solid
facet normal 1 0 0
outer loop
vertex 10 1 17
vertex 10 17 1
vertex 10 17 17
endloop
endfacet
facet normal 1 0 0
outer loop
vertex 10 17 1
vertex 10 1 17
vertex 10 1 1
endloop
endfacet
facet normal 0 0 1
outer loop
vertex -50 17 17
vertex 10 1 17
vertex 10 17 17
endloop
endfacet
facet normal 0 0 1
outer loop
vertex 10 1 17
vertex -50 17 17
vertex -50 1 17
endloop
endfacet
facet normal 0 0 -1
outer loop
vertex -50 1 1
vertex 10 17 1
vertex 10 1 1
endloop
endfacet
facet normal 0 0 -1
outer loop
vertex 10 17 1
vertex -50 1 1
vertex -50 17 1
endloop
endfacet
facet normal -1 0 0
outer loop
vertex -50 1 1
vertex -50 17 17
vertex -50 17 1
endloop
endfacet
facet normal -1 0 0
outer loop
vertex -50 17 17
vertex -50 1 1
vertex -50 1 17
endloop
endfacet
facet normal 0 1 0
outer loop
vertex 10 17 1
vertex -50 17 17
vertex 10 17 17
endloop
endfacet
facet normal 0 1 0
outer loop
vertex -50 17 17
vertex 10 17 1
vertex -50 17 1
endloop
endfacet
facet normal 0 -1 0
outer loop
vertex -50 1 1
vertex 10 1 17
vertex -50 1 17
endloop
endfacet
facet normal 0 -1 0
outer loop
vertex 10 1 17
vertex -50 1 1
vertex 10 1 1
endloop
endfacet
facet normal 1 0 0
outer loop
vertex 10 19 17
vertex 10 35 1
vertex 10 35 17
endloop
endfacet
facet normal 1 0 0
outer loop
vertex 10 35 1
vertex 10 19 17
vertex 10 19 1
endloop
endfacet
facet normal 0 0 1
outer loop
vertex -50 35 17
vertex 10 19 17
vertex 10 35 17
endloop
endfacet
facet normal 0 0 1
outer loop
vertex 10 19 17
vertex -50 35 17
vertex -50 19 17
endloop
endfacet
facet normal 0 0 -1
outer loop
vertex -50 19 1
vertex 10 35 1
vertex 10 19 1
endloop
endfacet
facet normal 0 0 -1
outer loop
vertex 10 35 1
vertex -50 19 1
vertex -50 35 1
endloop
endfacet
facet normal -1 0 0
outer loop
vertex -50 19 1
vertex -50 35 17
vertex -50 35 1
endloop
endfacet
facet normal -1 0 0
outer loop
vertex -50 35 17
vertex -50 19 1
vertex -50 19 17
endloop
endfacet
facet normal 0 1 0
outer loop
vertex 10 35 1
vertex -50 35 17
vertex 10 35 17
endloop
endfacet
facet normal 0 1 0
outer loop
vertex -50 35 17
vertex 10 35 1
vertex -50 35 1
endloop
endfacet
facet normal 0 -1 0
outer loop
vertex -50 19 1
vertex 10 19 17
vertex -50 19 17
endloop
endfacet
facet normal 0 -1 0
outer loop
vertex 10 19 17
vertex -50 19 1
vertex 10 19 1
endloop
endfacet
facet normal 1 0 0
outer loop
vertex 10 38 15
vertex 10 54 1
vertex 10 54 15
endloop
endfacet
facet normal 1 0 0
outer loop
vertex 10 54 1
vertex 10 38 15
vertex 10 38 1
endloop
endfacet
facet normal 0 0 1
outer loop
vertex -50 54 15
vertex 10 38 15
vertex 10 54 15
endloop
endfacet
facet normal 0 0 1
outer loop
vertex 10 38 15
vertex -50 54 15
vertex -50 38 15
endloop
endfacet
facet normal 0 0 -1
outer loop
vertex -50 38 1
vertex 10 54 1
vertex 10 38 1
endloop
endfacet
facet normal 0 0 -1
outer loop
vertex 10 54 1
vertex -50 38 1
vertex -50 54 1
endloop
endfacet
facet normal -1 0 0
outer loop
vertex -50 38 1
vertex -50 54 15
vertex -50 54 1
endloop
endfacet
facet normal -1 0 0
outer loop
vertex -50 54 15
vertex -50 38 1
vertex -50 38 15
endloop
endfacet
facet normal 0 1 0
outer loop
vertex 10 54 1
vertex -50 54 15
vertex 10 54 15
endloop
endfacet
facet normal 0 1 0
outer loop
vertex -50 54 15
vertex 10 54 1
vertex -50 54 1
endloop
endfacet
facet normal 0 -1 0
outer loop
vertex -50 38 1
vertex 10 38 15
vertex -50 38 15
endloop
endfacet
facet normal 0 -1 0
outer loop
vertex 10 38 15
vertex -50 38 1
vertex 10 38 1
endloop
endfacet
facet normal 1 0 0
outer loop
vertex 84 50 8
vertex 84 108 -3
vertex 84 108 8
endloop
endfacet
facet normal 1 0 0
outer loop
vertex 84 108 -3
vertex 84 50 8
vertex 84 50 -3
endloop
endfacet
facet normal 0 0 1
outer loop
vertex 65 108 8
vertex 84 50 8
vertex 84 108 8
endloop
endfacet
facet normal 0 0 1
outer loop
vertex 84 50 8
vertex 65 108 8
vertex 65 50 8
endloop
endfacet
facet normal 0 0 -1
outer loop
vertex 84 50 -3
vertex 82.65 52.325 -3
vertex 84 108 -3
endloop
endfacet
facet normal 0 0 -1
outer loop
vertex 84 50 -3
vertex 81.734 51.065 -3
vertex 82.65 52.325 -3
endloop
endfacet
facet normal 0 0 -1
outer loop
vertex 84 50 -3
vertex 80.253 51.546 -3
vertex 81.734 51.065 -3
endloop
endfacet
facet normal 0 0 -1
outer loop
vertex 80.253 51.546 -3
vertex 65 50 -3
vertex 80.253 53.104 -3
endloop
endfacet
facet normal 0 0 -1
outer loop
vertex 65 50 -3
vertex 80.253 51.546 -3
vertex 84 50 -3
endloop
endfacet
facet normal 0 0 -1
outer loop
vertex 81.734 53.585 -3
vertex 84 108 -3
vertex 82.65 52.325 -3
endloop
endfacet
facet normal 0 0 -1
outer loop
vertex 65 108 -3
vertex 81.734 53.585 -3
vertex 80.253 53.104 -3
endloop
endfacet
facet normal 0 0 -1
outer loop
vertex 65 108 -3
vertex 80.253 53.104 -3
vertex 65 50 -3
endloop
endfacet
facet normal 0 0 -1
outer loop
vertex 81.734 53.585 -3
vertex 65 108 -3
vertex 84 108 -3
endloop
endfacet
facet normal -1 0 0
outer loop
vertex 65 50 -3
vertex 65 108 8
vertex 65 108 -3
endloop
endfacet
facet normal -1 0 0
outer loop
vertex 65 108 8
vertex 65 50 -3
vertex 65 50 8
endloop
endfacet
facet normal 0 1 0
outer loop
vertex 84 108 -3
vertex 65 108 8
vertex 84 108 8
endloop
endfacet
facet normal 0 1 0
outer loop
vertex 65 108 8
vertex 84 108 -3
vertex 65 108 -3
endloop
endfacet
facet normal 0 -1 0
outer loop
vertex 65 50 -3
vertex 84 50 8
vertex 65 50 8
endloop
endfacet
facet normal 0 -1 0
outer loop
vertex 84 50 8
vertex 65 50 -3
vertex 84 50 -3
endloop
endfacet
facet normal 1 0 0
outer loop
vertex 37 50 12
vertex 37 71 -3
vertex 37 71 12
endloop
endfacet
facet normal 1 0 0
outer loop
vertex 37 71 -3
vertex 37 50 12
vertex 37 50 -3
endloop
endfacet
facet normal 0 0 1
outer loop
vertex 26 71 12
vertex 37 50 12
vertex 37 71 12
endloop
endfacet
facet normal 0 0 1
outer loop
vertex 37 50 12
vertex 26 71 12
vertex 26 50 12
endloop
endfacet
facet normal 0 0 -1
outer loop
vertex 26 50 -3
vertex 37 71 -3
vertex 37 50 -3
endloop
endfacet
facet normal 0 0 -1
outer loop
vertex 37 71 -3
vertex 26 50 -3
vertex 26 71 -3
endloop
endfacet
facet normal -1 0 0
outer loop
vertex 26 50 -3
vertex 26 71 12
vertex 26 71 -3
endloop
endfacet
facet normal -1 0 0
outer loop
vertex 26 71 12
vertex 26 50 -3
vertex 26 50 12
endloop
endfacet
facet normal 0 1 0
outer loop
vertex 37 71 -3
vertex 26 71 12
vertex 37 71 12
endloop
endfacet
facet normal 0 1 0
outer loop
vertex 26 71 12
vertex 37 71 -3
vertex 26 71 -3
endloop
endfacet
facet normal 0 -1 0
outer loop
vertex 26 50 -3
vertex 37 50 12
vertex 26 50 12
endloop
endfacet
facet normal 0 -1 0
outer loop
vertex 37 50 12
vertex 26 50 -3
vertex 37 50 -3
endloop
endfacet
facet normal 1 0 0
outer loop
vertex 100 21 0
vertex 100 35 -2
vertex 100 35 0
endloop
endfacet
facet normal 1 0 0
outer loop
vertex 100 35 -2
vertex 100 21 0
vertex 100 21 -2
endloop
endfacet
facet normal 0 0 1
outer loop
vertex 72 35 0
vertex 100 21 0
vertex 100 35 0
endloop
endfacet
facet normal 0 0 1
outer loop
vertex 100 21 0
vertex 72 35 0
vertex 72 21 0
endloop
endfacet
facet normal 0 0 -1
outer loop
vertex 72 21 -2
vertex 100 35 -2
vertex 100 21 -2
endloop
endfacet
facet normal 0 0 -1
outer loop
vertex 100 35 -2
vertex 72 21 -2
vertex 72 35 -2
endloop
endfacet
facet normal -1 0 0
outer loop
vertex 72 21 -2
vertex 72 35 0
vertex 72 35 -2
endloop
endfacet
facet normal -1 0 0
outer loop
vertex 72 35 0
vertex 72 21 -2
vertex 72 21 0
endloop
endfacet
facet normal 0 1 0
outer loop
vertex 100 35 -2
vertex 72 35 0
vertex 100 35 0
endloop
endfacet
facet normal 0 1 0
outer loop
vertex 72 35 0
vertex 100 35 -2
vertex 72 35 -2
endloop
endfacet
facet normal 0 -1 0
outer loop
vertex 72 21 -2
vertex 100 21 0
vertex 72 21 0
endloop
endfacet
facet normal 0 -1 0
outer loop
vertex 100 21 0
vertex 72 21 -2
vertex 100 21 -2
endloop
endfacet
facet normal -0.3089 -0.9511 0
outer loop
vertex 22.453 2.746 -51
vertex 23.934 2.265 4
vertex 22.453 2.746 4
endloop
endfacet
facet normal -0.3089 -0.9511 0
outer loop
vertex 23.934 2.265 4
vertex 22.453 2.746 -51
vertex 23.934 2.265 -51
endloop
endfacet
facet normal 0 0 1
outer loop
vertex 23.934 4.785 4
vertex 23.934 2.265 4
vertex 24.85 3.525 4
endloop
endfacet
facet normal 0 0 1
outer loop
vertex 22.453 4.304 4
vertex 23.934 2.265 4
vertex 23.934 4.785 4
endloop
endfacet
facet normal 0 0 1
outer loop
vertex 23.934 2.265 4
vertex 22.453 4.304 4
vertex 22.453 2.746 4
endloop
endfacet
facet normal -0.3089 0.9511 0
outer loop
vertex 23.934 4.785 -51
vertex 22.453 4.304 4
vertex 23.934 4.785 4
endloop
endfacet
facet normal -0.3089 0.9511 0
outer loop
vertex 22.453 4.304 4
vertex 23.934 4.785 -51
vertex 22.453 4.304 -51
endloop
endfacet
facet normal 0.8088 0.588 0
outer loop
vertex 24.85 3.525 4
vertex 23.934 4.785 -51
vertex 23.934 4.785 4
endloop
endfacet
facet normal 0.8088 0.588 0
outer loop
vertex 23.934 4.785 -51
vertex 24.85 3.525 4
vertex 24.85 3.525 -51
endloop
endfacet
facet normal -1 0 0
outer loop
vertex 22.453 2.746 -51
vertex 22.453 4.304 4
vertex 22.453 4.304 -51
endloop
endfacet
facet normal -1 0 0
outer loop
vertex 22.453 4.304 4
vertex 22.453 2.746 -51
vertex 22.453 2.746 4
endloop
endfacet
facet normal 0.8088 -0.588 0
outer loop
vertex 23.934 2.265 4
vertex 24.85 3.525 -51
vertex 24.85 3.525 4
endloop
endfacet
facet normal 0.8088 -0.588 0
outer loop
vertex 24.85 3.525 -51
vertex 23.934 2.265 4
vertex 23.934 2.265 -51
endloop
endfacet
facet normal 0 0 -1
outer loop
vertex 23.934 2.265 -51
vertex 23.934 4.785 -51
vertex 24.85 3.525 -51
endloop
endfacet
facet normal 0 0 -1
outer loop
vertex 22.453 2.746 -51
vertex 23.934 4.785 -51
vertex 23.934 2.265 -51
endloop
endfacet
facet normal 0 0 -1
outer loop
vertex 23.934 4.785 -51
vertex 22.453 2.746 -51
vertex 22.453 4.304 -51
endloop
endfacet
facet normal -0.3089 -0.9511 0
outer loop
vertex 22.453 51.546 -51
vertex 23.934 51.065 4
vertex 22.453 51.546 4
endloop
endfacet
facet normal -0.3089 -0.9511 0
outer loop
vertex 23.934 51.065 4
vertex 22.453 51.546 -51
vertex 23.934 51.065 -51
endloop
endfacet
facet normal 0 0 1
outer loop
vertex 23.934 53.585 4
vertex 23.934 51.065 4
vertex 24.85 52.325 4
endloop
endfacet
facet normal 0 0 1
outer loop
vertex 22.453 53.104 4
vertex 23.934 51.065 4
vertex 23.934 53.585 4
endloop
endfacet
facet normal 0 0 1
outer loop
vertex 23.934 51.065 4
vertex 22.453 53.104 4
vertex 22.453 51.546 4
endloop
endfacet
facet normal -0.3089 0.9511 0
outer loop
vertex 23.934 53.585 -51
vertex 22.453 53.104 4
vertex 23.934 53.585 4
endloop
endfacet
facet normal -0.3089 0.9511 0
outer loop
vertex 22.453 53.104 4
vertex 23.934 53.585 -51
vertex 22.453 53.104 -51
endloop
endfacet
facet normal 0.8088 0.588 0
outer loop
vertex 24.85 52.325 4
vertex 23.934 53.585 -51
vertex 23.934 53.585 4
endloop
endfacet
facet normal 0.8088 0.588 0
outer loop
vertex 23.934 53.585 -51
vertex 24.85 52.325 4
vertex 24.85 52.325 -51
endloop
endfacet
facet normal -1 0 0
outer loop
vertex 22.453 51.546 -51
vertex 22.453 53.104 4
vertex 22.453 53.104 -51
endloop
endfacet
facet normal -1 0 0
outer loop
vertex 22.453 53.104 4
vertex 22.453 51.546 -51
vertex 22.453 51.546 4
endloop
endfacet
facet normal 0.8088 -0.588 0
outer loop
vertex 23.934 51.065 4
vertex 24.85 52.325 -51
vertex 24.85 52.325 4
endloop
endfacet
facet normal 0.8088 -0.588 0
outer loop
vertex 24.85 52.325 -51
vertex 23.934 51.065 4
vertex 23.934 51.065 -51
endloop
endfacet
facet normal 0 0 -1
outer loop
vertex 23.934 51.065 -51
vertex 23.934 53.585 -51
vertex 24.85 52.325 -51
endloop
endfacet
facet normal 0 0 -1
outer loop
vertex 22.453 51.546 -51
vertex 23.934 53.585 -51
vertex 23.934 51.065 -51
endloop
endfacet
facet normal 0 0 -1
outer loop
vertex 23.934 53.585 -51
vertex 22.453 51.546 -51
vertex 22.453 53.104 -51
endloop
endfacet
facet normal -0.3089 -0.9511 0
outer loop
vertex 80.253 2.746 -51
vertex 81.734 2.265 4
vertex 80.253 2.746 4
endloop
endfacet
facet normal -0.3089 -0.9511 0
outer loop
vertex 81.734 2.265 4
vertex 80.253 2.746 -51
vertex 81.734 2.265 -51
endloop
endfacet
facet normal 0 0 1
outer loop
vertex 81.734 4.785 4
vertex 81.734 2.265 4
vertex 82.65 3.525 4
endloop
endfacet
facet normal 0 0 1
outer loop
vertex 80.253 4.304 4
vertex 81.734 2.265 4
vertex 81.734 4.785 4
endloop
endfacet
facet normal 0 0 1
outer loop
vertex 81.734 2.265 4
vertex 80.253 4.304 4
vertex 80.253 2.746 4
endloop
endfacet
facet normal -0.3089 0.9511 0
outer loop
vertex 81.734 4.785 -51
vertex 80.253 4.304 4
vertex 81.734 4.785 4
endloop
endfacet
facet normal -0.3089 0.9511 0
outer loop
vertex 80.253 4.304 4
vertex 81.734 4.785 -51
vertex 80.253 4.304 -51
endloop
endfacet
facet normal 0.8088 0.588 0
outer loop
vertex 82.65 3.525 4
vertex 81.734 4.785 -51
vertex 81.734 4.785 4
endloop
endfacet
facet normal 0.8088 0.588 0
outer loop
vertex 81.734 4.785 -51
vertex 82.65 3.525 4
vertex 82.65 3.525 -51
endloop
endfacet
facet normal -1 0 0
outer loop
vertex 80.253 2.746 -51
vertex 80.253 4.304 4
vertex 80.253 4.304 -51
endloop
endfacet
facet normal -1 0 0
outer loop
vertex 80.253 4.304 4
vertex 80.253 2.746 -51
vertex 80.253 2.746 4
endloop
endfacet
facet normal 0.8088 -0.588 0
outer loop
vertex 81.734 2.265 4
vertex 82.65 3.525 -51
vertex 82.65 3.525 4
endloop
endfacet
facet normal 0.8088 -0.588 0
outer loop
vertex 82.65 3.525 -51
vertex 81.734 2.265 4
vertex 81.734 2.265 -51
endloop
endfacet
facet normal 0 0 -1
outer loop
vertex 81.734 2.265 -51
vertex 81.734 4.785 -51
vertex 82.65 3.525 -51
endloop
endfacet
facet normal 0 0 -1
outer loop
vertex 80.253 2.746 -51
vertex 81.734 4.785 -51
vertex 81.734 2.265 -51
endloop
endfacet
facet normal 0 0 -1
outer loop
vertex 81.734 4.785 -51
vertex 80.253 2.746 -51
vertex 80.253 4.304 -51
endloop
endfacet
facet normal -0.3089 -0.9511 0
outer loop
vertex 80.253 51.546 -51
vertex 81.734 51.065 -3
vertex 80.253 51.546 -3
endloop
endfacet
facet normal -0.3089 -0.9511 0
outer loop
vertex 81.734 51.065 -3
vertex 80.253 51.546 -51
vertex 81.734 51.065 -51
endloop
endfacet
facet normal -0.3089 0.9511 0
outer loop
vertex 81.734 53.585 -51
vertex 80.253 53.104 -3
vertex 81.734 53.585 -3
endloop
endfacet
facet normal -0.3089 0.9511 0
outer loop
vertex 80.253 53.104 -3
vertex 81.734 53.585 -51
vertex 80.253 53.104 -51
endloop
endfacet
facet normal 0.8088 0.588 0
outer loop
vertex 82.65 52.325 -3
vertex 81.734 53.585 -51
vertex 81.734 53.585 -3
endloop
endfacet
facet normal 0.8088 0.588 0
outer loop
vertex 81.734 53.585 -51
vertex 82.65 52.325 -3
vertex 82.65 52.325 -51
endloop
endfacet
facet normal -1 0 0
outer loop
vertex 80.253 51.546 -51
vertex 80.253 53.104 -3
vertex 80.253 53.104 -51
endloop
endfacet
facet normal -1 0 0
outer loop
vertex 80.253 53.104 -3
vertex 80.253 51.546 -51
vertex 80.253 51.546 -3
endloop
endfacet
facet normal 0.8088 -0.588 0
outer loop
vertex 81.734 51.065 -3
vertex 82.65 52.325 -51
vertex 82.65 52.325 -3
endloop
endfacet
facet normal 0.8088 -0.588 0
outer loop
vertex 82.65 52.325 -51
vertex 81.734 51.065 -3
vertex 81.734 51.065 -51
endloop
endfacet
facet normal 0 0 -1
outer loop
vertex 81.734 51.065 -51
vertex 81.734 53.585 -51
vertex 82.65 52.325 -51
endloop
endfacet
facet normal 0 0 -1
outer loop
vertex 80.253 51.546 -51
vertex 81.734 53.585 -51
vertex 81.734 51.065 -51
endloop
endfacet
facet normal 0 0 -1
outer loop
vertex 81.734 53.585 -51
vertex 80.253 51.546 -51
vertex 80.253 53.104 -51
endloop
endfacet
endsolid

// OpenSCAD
module raspi(){
    //Base board
    translate([0,0,0]){
        color([0,1,0]){
            difference(){
                cube([85, 56, 1]);
                    r=2.65/2;
                    translate([22.2+r,2.2+r,-1])
                        cylinder(5,r,r);
                    translate([22.2+r,51+r,-1])
                        cylinder(5,r,r);
                    translate([80+r,2.2+r,-1])
                        cylinder(5,r,r);
                    translate([80+r,51+r,-1])
                        cylinder(5,r,r);
            }
        }
    }
    
    //usb 1
    translate([0,1.5, 1]){
        color([0.5,0.5,0.5])
            cube([17, 15, 16]);
    }
    
    //usb 2
    translate([0,19.5, 1]){
        color([0.5,0.5,0.5])
            cube([17, 15, 16]);
    }
    //ethernet
    translate([0,38, 1]){
        color([0.5,0.5,0.5])
            cube([21, 16, 14]);
    }
    
    //micro usb
    translate([70, 50, 1]){
        color([0.5,0.5,0.5])
            cube([9, 8, 3]);
    }
    
    //headphone
    translate([28, 50, 1]){
        color([0,0,0])
            cube([7, 8, 7]);
    }
    
    //microsd
    translate([72, 21, -2]){
        color([0.5,0.5,0.5])
            cube([18, 14, 2]);
    }
}


module raspiHoles(d){
    //usb 1
    translate([0-d,1.0, 1]){
        color([0.5,0.5,0.5]){
            cube([10+d, 16, 16]);
            
        }
    }
    
    //usb 2
    translate([0-d,19.0, 1]){
        color([0.5,0.5,0.5])
            cube([10+d, 16, 16]);
    }
    //ethernet
    translate([0-d,38, 1]){
        color([0.5,0.5,0.5])
            cube([10+d, 16, 14]);
    }
    //micro usb
    translate([70-5, 50, 1-4]){
        color([0.5,0.5,0.5])
            cube([9+10, 8+d, 3+8]);
    }
    
    //headphone
    translate([28-2, 50, 1-4]){
        color([0,0,0])
            cube([7+4, 8+13, 7+8]);
    }
    
    //microsd
    translate([72, 21, -2]){
        color([0.5,0.5,0.5])
            cube([18+10, 14, 2]);
    }
    r=2.65/2;
    translate([22.2+r,2.2+r,-1-d])
        cylinder(5+d,r,r);
    translate([22.2+r,51+r,-1-d])
        cylinder(5+d,r,r);
    translate([80+r,2.2+r,-1-d])
        cylinder(5+d,r,r);
    translate([80+r,51+r,-1-d])
        cylinder(5+d,r,r);
}


//raspi();
raspiHoles(50);
